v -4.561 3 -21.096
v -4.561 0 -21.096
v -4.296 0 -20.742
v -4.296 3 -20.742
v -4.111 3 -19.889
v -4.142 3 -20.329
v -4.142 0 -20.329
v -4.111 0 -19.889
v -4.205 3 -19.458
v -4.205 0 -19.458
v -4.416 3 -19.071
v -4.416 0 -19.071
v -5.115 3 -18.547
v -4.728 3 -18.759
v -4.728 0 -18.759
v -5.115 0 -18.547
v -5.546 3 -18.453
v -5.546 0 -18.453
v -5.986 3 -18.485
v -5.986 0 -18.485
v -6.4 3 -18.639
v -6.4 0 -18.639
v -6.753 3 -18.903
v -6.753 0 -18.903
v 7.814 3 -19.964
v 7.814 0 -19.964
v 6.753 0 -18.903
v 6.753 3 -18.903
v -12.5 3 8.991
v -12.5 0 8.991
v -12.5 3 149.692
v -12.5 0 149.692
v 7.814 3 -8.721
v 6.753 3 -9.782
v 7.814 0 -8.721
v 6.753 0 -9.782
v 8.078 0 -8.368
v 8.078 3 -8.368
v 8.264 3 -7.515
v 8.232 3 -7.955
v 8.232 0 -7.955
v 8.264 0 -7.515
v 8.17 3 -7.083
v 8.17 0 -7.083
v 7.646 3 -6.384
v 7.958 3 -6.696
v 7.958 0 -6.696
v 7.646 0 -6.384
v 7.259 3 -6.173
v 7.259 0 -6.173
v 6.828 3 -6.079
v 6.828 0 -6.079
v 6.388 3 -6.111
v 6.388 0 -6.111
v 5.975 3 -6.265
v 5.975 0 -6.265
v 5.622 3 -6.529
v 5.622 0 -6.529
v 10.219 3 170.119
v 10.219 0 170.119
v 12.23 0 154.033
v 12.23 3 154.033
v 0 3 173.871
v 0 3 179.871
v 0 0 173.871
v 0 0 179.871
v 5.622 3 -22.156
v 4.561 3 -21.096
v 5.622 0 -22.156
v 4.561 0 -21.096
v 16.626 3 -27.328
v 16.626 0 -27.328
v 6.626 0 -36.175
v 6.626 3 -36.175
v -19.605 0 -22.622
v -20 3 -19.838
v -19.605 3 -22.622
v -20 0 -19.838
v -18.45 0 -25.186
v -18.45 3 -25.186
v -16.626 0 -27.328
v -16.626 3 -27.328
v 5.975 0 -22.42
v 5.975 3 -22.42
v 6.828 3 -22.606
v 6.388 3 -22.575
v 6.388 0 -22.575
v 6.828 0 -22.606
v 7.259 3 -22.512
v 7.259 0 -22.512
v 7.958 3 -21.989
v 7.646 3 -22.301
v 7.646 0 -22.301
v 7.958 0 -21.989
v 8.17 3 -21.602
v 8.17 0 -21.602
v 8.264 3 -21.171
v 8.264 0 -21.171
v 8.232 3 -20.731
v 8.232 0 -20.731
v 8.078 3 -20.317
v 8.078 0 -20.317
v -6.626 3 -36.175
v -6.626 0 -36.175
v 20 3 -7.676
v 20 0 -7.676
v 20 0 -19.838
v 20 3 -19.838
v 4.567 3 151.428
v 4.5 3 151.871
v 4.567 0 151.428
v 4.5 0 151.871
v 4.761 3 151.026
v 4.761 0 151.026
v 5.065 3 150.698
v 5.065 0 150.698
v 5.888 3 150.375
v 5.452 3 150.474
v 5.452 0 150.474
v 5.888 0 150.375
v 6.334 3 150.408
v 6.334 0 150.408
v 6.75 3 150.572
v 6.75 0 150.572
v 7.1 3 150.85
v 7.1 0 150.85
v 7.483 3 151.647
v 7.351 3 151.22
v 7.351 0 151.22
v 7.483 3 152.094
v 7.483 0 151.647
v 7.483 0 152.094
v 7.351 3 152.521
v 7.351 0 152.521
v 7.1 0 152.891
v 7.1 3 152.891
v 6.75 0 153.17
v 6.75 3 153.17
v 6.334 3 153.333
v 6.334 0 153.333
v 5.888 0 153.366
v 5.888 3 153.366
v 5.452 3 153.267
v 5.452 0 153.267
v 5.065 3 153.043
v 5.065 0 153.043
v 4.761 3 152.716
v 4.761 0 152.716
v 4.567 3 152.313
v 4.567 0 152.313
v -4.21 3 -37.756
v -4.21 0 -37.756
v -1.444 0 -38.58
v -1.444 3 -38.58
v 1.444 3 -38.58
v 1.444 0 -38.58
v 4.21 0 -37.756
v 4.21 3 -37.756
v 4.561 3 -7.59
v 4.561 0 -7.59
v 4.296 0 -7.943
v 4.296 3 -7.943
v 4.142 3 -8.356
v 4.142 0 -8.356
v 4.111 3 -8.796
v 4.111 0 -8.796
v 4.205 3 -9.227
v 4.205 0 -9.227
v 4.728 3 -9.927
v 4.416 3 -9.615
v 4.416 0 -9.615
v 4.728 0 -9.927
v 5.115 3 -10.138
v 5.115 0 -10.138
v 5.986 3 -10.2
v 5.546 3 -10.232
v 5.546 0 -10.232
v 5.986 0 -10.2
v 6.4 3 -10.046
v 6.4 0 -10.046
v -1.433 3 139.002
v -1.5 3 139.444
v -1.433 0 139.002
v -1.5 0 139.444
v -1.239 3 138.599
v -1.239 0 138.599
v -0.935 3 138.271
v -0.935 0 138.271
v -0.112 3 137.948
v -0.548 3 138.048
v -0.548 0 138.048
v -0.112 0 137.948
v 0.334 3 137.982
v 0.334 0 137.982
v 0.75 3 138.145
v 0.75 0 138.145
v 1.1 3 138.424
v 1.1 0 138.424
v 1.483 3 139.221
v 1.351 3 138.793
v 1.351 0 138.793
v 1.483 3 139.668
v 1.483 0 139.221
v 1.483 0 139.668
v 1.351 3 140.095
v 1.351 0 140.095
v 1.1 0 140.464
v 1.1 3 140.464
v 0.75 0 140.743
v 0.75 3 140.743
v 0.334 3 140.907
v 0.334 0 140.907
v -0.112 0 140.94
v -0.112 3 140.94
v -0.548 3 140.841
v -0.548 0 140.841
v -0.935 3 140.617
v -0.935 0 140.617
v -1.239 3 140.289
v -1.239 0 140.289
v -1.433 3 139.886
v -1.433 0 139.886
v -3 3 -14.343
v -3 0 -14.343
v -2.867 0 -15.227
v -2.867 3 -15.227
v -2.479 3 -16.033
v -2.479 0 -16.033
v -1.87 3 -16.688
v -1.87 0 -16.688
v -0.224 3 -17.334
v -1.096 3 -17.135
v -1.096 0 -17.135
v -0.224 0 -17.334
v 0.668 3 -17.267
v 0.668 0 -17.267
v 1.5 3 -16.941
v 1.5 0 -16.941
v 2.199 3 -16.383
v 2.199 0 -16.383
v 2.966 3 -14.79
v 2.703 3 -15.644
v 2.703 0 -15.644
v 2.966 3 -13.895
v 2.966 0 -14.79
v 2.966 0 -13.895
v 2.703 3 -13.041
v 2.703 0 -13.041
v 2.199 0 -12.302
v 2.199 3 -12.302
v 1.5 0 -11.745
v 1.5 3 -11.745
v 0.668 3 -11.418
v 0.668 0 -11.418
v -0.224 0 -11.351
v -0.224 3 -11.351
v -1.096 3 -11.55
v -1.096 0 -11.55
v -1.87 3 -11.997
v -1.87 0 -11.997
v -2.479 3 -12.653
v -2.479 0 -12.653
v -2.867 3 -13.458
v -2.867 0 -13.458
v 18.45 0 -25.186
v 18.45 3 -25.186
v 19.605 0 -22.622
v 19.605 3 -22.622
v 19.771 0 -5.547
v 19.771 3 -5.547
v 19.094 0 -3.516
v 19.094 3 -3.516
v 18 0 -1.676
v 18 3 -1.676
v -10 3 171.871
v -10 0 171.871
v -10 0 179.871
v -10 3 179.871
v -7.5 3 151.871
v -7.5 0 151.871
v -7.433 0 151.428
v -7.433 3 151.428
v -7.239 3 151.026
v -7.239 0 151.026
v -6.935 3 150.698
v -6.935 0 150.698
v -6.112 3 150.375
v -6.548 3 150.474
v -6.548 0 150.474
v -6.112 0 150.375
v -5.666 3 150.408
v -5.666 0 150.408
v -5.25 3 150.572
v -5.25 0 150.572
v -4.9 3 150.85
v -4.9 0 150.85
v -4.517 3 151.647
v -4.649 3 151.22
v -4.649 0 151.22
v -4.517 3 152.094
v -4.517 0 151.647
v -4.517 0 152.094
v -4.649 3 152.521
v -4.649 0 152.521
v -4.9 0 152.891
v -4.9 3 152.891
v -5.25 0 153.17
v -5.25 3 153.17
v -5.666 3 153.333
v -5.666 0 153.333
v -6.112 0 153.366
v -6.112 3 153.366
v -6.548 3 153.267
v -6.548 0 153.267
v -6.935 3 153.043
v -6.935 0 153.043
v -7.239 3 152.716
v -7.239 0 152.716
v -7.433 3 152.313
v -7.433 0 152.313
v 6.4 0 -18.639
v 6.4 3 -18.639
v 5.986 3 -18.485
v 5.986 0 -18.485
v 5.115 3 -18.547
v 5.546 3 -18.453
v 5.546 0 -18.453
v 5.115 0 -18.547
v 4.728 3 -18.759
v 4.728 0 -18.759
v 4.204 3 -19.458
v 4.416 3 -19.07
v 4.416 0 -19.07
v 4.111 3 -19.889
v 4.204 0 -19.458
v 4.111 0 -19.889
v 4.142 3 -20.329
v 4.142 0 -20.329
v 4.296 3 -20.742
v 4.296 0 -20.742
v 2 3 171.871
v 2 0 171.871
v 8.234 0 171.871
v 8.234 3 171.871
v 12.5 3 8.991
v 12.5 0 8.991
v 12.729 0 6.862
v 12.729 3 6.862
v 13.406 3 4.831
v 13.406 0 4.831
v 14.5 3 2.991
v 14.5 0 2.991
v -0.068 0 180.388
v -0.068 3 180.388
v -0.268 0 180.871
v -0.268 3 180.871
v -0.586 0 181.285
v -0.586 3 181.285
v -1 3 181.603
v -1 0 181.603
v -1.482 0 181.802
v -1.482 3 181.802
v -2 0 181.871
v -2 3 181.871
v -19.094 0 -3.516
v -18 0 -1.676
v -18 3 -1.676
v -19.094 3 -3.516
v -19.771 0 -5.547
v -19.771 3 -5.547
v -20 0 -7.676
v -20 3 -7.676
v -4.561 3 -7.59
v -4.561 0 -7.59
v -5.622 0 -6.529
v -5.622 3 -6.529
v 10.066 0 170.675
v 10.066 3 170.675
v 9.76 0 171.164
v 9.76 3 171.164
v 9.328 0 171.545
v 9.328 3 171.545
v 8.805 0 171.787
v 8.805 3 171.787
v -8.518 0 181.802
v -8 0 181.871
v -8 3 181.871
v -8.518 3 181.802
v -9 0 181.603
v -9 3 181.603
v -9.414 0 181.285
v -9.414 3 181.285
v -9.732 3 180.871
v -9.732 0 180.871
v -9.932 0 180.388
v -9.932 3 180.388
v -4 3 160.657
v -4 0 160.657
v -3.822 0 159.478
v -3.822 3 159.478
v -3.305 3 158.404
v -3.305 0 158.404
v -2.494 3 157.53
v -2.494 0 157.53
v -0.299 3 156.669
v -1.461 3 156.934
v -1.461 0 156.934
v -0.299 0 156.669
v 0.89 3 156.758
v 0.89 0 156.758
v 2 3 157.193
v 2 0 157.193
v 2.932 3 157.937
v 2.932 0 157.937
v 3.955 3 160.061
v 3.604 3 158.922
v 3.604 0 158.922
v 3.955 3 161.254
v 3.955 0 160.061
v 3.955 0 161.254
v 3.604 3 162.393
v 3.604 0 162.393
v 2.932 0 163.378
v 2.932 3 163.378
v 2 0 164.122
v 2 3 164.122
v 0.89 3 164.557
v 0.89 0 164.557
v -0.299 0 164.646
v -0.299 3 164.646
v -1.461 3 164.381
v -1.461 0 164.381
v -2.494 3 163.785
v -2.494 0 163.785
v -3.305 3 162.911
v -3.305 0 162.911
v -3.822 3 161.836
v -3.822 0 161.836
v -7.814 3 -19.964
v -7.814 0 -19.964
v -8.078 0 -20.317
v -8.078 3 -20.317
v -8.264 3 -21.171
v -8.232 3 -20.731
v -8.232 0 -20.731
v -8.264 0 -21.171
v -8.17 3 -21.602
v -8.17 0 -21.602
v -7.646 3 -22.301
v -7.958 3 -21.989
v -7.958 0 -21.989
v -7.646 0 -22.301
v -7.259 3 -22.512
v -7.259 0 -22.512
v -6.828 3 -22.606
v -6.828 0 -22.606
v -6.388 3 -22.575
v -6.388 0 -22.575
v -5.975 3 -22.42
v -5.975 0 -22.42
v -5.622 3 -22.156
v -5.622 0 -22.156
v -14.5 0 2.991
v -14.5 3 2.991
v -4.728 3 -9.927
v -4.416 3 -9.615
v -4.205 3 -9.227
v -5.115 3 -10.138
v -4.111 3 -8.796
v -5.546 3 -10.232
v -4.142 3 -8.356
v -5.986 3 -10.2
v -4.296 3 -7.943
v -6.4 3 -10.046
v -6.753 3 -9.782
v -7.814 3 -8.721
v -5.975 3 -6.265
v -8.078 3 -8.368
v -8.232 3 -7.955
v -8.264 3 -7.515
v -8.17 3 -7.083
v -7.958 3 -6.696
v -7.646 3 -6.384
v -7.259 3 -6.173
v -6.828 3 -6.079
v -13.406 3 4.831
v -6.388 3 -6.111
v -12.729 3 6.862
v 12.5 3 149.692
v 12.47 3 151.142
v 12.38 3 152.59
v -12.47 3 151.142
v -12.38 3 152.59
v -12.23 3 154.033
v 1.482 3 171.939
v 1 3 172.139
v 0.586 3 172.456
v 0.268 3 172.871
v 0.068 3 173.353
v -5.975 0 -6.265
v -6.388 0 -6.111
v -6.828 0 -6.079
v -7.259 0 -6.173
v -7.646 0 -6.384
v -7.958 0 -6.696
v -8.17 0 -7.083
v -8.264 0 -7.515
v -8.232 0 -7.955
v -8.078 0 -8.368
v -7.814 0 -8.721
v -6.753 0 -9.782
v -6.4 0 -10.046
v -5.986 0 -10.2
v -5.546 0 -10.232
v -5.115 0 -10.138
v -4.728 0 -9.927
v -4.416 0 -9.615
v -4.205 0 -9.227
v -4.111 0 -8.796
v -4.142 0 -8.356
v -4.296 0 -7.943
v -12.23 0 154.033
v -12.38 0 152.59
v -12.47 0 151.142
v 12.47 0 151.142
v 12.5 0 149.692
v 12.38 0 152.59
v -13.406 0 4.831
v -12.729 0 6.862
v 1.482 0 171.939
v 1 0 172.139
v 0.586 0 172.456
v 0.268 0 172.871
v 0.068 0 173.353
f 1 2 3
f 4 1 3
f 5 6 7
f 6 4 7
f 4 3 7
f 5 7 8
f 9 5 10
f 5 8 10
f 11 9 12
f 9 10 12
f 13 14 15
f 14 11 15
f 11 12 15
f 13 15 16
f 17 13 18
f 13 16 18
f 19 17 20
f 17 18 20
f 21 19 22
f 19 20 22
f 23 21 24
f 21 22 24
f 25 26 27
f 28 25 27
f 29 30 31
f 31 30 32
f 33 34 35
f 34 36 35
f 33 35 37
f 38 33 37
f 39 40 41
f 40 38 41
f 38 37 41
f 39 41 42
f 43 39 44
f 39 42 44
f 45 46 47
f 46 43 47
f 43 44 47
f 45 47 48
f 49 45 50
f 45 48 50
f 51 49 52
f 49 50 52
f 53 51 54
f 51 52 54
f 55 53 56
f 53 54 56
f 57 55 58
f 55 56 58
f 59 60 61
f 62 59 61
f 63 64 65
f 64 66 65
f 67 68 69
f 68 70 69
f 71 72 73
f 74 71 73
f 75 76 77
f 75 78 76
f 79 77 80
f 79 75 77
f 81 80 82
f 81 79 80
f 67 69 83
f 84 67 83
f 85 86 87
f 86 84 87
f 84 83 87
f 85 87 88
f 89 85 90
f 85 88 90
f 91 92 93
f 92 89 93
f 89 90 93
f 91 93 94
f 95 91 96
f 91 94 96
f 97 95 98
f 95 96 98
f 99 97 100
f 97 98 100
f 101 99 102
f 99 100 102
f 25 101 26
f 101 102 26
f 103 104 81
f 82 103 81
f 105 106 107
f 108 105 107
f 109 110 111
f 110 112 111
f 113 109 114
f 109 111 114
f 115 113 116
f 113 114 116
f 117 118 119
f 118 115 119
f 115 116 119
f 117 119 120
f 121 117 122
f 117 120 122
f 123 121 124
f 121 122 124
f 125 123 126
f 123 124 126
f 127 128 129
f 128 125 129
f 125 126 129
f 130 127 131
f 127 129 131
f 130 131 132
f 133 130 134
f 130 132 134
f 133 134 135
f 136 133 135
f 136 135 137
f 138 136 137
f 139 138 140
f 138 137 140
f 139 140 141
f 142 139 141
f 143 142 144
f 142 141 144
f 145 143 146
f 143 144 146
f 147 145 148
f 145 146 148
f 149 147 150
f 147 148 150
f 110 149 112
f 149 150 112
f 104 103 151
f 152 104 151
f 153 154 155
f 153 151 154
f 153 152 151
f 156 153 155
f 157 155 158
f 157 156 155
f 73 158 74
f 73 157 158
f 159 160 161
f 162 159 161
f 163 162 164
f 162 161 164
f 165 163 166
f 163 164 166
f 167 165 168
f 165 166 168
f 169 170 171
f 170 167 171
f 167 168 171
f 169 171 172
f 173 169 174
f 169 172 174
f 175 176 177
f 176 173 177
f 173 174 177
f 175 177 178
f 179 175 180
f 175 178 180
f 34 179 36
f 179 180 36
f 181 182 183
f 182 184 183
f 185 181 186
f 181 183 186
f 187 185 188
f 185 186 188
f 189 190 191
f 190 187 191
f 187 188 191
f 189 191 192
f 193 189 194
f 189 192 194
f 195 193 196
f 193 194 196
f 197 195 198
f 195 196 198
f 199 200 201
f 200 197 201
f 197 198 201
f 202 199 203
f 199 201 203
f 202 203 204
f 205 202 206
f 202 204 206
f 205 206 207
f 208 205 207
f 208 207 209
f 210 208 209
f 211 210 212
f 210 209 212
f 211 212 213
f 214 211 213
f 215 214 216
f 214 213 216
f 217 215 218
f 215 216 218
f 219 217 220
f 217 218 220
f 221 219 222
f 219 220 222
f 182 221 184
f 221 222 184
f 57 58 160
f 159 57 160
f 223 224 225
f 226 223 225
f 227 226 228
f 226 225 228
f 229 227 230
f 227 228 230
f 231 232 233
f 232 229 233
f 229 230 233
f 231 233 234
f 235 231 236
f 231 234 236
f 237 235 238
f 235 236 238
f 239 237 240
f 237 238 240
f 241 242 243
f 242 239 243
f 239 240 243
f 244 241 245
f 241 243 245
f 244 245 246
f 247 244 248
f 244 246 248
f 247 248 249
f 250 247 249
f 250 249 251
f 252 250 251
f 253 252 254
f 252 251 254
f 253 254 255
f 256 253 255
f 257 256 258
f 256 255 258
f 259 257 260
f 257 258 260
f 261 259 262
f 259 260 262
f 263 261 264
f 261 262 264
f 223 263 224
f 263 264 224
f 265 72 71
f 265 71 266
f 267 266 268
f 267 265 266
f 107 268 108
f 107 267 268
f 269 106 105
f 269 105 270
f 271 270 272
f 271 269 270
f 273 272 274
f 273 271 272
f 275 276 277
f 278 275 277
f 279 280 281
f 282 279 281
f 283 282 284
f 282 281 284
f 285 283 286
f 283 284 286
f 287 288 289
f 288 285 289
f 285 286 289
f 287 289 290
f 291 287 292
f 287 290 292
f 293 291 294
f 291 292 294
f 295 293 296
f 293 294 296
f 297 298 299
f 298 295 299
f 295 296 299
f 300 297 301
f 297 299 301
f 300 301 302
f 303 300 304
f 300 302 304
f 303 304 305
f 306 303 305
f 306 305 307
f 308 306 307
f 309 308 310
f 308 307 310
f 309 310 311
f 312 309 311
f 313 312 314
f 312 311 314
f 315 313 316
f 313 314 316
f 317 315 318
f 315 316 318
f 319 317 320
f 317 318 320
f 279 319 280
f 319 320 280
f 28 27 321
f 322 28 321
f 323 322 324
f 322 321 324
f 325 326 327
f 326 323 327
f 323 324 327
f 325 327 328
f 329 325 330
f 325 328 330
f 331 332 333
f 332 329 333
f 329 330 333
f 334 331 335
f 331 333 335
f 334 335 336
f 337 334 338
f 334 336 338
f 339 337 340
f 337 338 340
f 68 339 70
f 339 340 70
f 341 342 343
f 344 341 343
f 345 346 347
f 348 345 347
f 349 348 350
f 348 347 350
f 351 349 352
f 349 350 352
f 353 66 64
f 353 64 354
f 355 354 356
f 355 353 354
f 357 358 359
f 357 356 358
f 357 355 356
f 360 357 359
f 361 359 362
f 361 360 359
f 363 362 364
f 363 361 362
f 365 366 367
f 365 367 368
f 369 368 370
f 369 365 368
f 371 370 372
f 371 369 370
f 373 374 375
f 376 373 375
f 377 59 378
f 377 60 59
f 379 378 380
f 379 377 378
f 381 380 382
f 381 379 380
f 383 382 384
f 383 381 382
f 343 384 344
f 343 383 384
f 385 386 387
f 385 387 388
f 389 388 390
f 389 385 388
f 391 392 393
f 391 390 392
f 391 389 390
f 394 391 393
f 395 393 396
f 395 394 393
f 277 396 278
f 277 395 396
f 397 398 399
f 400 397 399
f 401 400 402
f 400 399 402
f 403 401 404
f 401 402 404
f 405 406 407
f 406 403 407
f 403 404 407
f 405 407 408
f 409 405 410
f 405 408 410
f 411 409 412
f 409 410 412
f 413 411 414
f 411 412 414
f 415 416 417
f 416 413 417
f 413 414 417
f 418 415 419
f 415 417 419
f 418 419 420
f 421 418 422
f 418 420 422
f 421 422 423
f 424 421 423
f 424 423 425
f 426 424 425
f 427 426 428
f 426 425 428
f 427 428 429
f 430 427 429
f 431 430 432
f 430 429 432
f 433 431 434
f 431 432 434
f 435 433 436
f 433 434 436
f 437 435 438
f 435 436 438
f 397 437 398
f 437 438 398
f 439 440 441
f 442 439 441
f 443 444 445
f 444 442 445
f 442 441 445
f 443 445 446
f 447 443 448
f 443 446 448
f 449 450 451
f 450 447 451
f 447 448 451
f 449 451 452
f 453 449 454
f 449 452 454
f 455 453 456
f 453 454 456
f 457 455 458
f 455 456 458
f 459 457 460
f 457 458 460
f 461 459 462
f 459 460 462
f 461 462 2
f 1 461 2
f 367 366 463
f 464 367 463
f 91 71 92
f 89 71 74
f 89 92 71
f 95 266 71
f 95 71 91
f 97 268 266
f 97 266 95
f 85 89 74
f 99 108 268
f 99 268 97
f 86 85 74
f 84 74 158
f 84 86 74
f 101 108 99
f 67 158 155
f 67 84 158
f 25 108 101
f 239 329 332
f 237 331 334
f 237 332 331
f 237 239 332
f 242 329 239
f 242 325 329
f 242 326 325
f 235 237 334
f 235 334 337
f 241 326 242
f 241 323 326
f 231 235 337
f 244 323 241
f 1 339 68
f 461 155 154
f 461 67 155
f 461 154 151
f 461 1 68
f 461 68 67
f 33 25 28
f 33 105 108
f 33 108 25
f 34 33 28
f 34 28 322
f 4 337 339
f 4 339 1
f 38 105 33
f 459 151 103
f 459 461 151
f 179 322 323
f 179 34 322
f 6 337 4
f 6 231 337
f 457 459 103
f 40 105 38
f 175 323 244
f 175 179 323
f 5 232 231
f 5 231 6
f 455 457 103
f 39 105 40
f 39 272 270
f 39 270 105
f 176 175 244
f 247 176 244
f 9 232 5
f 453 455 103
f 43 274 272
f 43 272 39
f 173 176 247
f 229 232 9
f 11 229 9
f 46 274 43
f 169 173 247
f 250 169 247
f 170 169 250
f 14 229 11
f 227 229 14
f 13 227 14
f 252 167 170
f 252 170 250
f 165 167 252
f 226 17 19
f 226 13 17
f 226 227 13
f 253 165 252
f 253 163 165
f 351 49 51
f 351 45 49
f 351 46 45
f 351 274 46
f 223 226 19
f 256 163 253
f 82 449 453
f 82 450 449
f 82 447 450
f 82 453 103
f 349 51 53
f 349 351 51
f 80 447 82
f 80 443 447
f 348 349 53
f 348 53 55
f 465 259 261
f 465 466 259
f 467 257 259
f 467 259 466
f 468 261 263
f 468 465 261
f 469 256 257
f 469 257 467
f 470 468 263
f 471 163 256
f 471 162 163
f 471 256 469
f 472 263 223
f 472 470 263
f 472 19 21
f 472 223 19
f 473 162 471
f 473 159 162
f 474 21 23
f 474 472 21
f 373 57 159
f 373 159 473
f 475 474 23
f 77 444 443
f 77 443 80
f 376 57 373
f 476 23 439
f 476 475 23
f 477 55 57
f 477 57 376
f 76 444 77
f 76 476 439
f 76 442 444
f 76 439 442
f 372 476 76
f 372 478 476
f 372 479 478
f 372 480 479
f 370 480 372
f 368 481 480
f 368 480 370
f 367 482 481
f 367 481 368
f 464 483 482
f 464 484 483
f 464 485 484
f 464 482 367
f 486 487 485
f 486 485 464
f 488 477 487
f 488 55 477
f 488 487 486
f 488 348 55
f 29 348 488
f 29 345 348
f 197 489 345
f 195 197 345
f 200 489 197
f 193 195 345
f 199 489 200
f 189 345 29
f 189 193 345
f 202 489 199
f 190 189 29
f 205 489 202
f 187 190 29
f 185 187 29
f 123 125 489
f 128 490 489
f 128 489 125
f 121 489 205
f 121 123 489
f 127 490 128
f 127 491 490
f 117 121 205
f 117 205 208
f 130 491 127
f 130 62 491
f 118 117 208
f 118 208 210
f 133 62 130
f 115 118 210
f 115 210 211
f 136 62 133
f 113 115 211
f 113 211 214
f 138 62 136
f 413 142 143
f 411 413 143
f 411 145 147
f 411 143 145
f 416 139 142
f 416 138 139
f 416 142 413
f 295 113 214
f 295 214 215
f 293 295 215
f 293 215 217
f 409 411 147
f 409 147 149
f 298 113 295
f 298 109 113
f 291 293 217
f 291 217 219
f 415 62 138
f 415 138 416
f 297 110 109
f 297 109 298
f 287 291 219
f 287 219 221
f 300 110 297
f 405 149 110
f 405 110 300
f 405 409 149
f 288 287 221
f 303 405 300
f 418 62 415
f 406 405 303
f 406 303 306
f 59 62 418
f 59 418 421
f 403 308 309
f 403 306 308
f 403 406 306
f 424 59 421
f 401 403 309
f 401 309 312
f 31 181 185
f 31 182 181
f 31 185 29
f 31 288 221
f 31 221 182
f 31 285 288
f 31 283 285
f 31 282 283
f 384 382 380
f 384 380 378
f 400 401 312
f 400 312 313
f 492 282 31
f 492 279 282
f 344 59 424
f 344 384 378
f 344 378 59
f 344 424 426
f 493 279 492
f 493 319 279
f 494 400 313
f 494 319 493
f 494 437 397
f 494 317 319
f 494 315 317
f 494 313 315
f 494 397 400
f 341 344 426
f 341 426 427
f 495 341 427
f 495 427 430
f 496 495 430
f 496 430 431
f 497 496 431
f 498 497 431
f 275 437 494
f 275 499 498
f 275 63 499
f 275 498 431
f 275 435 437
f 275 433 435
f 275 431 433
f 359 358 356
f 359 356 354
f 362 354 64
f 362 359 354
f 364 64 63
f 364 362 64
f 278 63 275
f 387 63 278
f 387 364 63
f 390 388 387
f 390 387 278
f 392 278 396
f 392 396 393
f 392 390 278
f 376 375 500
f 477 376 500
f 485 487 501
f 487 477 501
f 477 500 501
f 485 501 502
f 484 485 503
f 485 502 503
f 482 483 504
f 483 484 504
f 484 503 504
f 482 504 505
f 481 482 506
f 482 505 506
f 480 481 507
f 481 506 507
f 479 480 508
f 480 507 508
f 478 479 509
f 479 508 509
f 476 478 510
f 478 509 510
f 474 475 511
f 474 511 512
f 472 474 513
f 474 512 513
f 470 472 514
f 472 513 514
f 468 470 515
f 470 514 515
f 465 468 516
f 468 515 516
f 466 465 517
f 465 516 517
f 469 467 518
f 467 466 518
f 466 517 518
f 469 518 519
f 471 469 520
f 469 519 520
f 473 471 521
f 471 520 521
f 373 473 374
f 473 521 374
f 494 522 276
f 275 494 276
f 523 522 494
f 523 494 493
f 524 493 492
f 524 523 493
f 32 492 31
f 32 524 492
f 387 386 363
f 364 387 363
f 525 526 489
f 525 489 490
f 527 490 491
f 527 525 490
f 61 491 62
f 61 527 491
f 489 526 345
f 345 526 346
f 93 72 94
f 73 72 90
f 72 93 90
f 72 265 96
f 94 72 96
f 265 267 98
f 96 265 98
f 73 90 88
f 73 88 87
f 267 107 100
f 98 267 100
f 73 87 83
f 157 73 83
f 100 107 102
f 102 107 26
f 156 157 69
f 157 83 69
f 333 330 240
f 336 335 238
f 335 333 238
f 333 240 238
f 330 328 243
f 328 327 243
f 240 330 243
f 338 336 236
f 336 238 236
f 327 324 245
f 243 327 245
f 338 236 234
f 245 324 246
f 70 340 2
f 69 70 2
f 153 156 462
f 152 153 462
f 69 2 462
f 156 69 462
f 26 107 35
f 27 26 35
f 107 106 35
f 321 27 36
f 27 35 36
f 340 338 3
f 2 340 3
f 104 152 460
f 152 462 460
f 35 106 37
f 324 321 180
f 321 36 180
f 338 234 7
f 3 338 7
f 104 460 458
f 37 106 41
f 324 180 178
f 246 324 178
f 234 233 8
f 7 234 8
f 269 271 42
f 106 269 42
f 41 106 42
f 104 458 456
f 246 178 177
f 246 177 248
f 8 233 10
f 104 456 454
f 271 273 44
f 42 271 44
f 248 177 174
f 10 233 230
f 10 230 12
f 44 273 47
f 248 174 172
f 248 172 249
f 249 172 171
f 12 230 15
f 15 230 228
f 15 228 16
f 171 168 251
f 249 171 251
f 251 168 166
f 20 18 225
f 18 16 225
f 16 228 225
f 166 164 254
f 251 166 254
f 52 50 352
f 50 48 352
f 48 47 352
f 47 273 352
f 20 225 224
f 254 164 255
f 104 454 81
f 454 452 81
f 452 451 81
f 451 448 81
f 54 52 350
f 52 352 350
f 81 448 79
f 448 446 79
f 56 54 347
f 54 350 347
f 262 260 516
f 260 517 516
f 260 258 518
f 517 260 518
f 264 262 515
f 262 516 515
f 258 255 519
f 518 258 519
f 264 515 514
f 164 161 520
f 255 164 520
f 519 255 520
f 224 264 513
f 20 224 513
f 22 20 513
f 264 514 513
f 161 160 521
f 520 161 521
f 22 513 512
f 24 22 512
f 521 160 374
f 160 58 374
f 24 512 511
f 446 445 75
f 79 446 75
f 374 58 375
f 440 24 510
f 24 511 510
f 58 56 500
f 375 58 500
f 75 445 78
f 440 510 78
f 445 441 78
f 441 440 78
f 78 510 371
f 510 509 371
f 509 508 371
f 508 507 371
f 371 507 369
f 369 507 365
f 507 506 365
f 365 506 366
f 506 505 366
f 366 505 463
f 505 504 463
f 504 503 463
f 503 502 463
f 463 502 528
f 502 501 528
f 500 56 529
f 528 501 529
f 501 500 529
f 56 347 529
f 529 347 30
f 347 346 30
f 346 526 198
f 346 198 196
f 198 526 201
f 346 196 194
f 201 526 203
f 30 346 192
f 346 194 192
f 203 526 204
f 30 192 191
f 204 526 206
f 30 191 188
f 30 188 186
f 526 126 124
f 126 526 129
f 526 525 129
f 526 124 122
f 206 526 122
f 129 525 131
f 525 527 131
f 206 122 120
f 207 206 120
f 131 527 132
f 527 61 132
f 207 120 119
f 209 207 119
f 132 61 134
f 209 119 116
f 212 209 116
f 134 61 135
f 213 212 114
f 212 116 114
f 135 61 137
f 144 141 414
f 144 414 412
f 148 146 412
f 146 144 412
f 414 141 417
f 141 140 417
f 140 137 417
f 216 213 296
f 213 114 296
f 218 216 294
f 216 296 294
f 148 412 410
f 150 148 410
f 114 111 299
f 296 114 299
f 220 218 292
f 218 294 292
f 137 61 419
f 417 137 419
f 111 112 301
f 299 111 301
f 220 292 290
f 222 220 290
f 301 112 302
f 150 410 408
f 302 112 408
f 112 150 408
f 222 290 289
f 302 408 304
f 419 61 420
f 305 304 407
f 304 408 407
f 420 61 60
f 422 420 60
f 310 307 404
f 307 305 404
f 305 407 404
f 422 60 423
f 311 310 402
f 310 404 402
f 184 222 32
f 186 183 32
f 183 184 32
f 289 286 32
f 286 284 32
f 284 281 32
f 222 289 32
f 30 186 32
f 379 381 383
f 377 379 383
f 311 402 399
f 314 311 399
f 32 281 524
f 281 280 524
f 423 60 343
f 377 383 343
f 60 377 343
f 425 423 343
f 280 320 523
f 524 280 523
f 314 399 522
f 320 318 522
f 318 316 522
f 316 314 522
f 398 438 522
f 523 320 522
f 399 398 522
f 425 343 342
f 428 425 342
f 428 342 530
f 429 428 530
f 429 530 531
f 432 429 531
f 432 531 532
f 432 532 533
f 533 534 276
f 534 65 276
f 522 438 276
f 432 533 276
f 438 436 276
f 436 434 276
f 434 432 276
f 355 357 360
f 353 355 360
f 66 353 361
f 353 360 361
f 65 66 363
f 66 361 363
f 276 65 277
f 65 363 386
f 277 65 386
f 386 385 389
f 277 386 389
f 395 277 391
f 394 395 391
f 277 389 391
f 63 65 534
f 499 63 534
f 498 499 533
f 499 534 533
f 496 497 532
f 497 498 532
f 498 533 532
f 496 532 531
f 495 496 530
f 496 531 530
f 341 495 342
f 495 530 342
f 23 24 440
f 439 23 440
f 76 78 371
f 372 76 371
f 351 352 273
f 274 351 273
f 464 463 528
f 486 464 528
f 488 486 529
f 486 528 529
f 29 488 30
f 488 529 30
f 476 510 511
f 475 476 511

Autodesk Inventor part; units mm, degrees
ref_plane "YZ Plane" through (0, 0, 0) normal (1, 0, 0) x (0, 1, 0)
ref_plane "XZ Plane" through (0, 0, 0) normal (0, 1, 0) x (-1, 0, 0)
ref_plane "XY Plane" through (0, 0, 0) normal (0, 0, 1) x (1, 0, 0)
sketch "Sketch3" plane through (0, 0, 0) normal (0, 1, 0) x (-1, 0, 0)
  line L0 (6.6262, -36.1747) -> (16.6262, -27.3275)
  arc A0 (16.6262, -27.3275) -> (20, -19.8379) centre (10, -19.8379) ccw
  line L1 (20, -19.8379) -> (20, -7.6759)
  arc A1 (20, -7.6759) -> (18, -1.6759) centre (10, -7.6759) ccw
  line L2 (18, -1.6759) -> (14.5, 2.9908)
  arc A2 (12.5, 8.9908) -> (14.5, 2.9908) centre (22.5, 8.9908) ccw
  arc A3 (-14.5, 2.9908) -> (-12.5, 8.9908) centre (-22.5, 8.9908) ccw
  line L3 (-14.5, 2.9908) -> (-18, -1.6759)
  arc A4 (-18, -1.6759) -> (-20, -7.6759) centre (-10, -7.6759) ccw
  line L4 (-20, -7.6759) -> (-20, -19.8379)
  arc A5 (-20, -19.8379) -> (-16.6262, -27.3275) centre (-10, -19.8379) ccw
  line L5 (-16.6262, -27.3275) -> (-6.6262, -36.1747)
  arc A6 (-6.6262, -36.1747) -> (6.6262, -36.1747) centre (0, -28.6852) ccw
  line L6 (-7.8135, -19.9641) -> (-6.7529, -18.9034)
  arc A7 (-4.5608, -21.0955) -> (-6.7529, -18.9034) centre (-5.6569, -19.9994) ccw
  line L7 (-4.5608, -21.0955) -> (-5.6215, -22.1561)
  arc A8 (-7.8135, -19.9641) -> (-5.6215, -22.1561) centre (-6.7175, -21.0601) ccw
  arc A9 (5.6215, -22.1561) -> (7.8135, -19.9641) centre (6.7175, -21.0601) ccw
  line L8 (5.6215, -22.1561) -> (4.5608, -21.0955)
  arc A10 (6.7529, -18.9034) -> (4.5608, -21.0955) centre (5.6569, -19.9994) ccw
  line L9 (6.7529, -18.9034) -> (7.8135, -19.9641)
  arc A11 (-6.7529, -9.7817) -> (-4.5608, -7.5897) centre (-5.6569, -8.6857) ccw
  line L10 (-6.7529, -9.7817) -> (-7.8135, -8.7211)
  arc A12 (-5.6215, -6.5291) -> (-7.8135, -8.7211) centre (-6.7175, -7.6251) ccw
  line L11 (-5.6215, -6.5291) -> (-4.5608, -7.5897)
  arc A13 (7.8135, -8.7211) -> (5.6215, -6.5291) centre (6.7175, -7.6251) ccw
  line L12 (7.8135, -8.7211) -> (6.7529, -9.7817)
  arc A14 (4.5608, -7.5897) -> (6.7529, -9.7817) centre (5.6569, -8.6857) ccw
  line L13 (4.5608, -7.5897) -> (5.6215, -6.5291)
  circle A15 centre (0, -14.3426) radius 3
  line L14 (-12.5, 8.9908) -> (12.5, 8.9908) construction
  arc A16 (12.5, 149.6916) -> (12.2297, 154.0328) centre (-22.5, 149.6916) ccw
  line L15 (12.2297, 154.0328) -> (10, 171.8706)
  line L16 (10, 171.8706) -> (10, 179.8706)
  arc A17 (10, 179.8706) -> (8, 181.8706) centre (8, 179.8706) ccw
  line L17 (8, 181.8706) -> (2, 181.8706)
  arc A18 (2, 181.8706) -> (0, 179.8706) centre (2, 179.8706) ccw
  line L18 (0, 179.8706) -> (0, 173.8706)
  arc A19 (-2, 171.8706) -> (0, 173.8706) centre (-2, 173.8706) ccw
  line L19 (-2, 171.8706) -> (-8.2344, 171.8706)
  arc A20 (-8.2344, 171.8706) -> (-10.219, 170.1187) centre (-8.2344, 169.8706) ccw
  line L20 (-10.219, 170.1187) -> (-12.2297, 154.0328)
  arc A21 (-12.2297, 154.0328) -> (-12.5, 149.6916) centre (22.5, 149.6916) ccw
  circle A22 centre (6, 151.8706) radius 1.5
  circle A23 centre (-6, 151.8706) radius 1.5
  circle A24 centre (0, 139.4442) radius 1.5
  circle A25 centre (0, 160.6574) radius 4
  line L21 (-12.5, 149.6916) -> (12.5, 149.6916) construction
  line L22 (0, -14.3426) -> (0, 160.6574) construction
  line L23 (12.5, 8.9908) -> (12.5, 149.6916)
  line L24 (-12.5, 149.6916) -> (-12.5, 8.9908)
  dimension "d4" = 21.2132
  dimension "d7" = 12
  dimension "d10" = 175
extrude "Extrusion1" add sketch "Sketch3" along normal blind 3
sketch "Sketch4" plane through (0, 3, 0) normal (0, 1, 0) x (1, 0, 0)
  circle A0 centre (0, 14.3426) radius 3 construction
  circle A1 centre (0, 14.3426) radius 88.9 construction
  circle A2 centre (0, -160.6574) radius 4 projected
  point P0 (0, 0)
  dimension "d9" = 177.8
  dimension "d11" = 175
sketch "Sketch5" plane through (0, 3, 0) normal (0, 1, 0) x (1, 0, 0)
  line L0 (-18, 1.6759) -> (-14.5, -2.9908) projected
  arc A0 (-12.5, -8.9908) -> (-14.5, -2.9908) centre (-22.5, -8.9908) ccw projected
  line L1 (-12.5, -8.9908) -> (-12.5, -149.6916) projected
  line L2 (14.5, -2.9908) -> (18, 1.6759) projected
  arc A1 (14.5, -2.9908) -> (12.5, -8.9908) centre (22.5, -8.9908) ccw projected
  line L3 (12.5, -149.6916) -> (12.5, -8.9908) projected
  circle A2 centre (0, 14.3426) radius 3 construction
  circle A3 centre (0, -139.4442) radius 1.5 construction
  line L4 (0, 14.3426) -> (0, -139.4442) construction
  line L5 (7.5, 14.3426) -> (7.5, -139.4442)
  line L6 (-7.5, 14.3426) -> (-7.5, -139.4442)
  arc A4 (14.5, -2.9908) -> (12.5, -8.9908) centre (22.5, -8.9908) ccw projected
  line L7 (14.5, -2.9908) -> (5.7311, -14.6826)
  arc A5 (-12.5, -8.9908) -> (-14.5, -2.9908) centre (-22.5, -8.9908) ccw projected
  line L8 (-14.5, -2.9908) -> (-5.817, -14.5681)
  circle A6 centre (0, 14.3426) radius 88.9 construction
  line L9 (7.5, -74.2405) -> (12.5, -80.9071)
  line L10 (-7.5, -74.2405) -> (-12.5, -80.9071)
  point P0 (0, 0)
  point P1 (7.5, -12.3241)
  point P2 (-7.5, -12.3241)
  dimension "d12" = 7.5
  dimension "d13" = 7.5
  dimension "d14" = 143.13
  dimension "d15" = 143.13
  dimension "d16" = 143.13
extrude "Extrusion2" [suppressed]
fillet "Fillet1" [suppressed]
properties part number "Kauri arm long"
